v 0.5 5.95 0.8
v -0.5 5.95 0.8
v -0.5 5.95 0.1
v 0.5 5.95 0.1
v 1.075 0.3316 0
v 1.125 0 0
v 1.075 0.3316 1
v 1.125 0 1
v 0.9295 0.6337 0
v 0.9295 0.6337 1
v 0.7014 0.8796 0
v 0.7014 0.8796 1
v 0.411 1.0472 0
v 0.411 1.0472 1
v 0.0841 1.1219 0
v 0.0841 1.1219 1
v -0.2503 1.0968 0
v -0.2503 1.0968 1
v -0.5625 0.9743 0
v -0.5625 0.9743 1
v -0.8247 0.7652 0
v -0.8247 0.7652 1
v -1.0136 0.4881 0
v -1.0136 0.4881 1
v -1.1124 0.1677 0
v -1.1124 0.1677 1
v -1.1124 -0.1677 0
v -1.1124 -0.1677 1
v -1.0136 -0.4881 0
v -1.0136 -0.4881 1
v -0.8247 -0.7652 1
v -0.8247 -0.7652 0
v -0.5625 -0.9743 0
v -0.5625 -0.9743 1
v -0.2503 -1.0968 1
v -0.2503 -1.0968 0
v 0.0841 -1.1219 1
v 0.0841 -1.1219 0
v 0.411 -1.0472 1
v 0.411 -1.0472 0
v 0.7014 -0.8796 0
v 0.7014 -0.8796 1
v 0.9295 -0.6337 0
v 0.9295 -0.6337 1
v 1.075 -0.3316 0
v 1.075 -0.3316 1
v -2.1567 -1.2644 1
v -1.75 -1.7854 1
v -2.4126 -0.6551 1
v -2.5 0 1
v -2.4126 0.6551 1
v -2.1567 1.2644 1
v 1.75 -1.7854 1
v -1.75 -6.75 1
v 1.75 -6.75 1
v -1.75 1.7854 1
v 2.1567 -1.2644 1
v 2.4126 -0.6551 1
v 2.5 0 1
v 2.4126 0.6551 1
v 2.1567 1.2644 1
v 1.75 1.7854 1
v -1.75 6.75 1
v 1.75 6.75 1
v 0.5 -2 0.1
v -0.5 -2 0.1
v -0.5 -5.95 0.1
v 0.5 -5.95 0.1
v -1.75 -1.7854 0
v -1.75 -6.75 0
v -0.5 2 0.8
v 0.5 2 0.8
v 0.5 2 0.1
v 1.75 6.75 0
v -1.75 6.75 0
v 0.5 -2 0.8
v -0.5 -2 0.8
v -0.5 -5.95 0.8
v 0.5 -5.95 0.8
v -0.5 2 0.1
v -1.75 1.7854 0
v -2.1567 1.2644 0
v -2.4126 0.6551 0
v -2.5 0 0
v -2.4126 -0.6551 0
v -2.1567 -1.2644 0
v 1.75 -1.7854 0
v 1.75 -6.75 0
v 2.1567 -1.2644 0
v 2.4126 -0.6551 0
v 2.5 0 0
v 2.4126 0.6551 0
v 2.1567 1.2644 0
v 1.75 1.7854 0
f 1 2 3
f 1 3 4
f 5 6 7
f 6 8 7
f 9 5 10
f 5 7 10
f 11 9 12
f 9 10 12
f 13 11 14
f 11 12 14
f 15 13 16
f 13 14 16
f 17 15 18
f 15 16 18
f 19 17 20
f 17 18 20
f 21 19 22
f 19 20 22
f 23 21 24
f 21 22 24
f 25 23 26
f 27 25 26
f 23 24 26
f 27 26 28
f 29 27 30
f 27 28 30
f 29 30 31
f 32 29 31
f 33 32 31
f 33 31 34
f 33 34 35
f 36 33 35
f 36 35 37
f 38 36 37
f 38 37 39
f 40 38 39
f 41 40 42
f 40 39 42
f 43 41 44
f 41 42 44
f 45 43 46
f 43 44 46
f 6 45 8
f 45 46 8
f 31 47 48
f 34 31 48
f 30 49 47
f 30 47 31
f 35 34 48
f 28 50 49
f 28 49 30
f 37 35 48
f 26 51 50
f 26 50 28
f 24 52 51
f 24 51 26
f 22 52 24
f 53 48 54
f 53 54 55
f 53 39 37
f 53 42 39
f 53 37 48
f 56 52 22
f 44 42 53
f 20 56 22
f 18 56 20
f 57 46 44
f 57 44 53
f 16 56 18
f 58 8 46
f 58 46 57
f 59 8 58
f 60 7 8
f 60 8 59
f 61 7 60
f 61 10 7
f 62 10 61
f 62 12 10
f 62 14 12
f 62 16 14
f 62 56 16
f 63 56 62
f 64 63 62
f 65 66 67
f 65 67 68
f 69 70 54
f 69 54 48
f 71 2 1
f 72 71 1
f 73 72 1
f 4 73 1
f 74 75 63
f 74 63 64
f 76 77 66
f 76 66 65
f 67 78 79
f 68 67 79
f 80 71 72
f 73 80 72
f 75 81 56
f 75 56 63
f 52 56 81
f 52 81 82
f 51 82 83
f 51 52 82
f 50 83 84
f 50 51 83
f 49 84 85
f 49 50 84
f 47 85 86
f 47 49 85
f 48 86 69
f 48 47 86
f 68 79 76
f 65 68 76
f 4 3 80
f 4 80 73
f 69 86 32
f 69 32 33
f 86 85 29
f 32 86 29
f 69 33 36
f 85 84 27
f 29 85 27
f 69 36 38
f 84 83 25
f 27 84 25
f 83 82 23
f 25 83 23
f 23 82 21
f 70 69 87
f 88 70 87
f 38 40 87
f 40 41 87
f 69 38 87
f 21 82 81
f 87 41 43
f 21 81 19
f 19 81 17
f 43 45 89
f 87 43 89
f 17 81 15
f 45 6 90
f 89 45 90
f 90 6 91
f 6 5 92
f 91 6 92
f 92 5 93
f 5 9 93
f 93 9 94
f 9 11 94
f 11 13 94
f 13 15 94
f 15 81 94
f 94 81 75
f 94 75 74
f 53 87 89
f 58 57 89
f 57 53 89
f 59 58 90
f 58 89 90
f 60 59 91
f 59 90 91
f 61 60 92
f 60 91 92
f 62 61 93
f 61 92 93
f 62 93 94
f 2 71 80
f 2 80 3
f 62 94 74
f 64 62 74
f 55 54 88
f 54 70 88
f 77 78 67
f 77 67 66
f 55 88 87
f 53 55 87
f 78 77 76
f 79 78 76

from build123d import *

# Parameters (mm, degrees)
SKETCH_W        = 3.5
SKETCH_H        = 13.5
PAD_DEPTH       = 0.8
SKETCH003_R     = 2.5
PAD001_DEPTH    = 0.8
SKETCH002_W     = 1
SKETCH002_H     = 3.95
POCKET_DEPTH    = 1.2
SKETCH001_R     = 1.125
POCKET001_DEPTH = 5
SKETCH004_W     = 3.5
SKETCH004_H     = 13.5
PAD002_DEPTH    = 0.2
SKETCH005_R     = 2.5
PAD003_DEPTH    = 0.2
SKETCH006_R     = 1.125
POCKET002_DEPTH = 5


with BuildPart() as part:
    # Sketch → Pad (new body)
    with BuildSketch(Plane.XY):
        Rectangle(SKETCH_W, SKETCH_H)
    extrude(amount=PAD_DEPTH)

    # Sketch003 (on Face6 of Pad) → Pad001 (join)
    with BuildSketch(Plane.XY.offset(0.8)):
        Circle(SKETCH003_R)
    extrude(amount=-PAD001_DEPTH)

    # Sketch002 → Pocket (cut)
    with BuildSketch(Plane.XY.offset(1.3)):
        with Locations((0, 3.975)):
            Rectangle(SKETCH002_W, SKETCH002_H)
        with Locations((0, -3.975)):
            Rectangle(SKETCH002_W, SKETCH002_H)
    extrude(amount=-POCKET_DEPTH, mode=Mode.SUBTRACT)

    # Sketch001 (on Face6 of Pad) → Pocket001 (cut)
    with BuildSketch(Plane.XY.offset(0.8)):
        Circle(SKETCH001_R)
    extrude(amount=-POCKET001_DEPTH, mode=Mode.SUBTRACT)

    # Sketch004 (on Face5 of Pocket001) → Pad002 (join)
    with BuildSketch(Plane.XY.offset(0.8)):
        Rectangle(SKETCH004_W, SKETCH004_H)
    extrude(amount=PAD002_DEPTH)

    # Sketch005 (on Face16 of Pad002) → Pad003 (join)
    with BuildSketch(Plane.XY.offset(0.8)):
        Circle(SKETCH005_R)
    extrude(amount=PAD003_DEPTH)

    # Sketch006 (on Face28 of Pad003) → Pocket002 (cut)
    with BuildSketch(Plane.XY.offset(1)):
        Circle(SKETCH006_R)
    extrude(amount=-POCKET002_DEPTH, mode=Mode.SUBTRACT)


solid = part.part
